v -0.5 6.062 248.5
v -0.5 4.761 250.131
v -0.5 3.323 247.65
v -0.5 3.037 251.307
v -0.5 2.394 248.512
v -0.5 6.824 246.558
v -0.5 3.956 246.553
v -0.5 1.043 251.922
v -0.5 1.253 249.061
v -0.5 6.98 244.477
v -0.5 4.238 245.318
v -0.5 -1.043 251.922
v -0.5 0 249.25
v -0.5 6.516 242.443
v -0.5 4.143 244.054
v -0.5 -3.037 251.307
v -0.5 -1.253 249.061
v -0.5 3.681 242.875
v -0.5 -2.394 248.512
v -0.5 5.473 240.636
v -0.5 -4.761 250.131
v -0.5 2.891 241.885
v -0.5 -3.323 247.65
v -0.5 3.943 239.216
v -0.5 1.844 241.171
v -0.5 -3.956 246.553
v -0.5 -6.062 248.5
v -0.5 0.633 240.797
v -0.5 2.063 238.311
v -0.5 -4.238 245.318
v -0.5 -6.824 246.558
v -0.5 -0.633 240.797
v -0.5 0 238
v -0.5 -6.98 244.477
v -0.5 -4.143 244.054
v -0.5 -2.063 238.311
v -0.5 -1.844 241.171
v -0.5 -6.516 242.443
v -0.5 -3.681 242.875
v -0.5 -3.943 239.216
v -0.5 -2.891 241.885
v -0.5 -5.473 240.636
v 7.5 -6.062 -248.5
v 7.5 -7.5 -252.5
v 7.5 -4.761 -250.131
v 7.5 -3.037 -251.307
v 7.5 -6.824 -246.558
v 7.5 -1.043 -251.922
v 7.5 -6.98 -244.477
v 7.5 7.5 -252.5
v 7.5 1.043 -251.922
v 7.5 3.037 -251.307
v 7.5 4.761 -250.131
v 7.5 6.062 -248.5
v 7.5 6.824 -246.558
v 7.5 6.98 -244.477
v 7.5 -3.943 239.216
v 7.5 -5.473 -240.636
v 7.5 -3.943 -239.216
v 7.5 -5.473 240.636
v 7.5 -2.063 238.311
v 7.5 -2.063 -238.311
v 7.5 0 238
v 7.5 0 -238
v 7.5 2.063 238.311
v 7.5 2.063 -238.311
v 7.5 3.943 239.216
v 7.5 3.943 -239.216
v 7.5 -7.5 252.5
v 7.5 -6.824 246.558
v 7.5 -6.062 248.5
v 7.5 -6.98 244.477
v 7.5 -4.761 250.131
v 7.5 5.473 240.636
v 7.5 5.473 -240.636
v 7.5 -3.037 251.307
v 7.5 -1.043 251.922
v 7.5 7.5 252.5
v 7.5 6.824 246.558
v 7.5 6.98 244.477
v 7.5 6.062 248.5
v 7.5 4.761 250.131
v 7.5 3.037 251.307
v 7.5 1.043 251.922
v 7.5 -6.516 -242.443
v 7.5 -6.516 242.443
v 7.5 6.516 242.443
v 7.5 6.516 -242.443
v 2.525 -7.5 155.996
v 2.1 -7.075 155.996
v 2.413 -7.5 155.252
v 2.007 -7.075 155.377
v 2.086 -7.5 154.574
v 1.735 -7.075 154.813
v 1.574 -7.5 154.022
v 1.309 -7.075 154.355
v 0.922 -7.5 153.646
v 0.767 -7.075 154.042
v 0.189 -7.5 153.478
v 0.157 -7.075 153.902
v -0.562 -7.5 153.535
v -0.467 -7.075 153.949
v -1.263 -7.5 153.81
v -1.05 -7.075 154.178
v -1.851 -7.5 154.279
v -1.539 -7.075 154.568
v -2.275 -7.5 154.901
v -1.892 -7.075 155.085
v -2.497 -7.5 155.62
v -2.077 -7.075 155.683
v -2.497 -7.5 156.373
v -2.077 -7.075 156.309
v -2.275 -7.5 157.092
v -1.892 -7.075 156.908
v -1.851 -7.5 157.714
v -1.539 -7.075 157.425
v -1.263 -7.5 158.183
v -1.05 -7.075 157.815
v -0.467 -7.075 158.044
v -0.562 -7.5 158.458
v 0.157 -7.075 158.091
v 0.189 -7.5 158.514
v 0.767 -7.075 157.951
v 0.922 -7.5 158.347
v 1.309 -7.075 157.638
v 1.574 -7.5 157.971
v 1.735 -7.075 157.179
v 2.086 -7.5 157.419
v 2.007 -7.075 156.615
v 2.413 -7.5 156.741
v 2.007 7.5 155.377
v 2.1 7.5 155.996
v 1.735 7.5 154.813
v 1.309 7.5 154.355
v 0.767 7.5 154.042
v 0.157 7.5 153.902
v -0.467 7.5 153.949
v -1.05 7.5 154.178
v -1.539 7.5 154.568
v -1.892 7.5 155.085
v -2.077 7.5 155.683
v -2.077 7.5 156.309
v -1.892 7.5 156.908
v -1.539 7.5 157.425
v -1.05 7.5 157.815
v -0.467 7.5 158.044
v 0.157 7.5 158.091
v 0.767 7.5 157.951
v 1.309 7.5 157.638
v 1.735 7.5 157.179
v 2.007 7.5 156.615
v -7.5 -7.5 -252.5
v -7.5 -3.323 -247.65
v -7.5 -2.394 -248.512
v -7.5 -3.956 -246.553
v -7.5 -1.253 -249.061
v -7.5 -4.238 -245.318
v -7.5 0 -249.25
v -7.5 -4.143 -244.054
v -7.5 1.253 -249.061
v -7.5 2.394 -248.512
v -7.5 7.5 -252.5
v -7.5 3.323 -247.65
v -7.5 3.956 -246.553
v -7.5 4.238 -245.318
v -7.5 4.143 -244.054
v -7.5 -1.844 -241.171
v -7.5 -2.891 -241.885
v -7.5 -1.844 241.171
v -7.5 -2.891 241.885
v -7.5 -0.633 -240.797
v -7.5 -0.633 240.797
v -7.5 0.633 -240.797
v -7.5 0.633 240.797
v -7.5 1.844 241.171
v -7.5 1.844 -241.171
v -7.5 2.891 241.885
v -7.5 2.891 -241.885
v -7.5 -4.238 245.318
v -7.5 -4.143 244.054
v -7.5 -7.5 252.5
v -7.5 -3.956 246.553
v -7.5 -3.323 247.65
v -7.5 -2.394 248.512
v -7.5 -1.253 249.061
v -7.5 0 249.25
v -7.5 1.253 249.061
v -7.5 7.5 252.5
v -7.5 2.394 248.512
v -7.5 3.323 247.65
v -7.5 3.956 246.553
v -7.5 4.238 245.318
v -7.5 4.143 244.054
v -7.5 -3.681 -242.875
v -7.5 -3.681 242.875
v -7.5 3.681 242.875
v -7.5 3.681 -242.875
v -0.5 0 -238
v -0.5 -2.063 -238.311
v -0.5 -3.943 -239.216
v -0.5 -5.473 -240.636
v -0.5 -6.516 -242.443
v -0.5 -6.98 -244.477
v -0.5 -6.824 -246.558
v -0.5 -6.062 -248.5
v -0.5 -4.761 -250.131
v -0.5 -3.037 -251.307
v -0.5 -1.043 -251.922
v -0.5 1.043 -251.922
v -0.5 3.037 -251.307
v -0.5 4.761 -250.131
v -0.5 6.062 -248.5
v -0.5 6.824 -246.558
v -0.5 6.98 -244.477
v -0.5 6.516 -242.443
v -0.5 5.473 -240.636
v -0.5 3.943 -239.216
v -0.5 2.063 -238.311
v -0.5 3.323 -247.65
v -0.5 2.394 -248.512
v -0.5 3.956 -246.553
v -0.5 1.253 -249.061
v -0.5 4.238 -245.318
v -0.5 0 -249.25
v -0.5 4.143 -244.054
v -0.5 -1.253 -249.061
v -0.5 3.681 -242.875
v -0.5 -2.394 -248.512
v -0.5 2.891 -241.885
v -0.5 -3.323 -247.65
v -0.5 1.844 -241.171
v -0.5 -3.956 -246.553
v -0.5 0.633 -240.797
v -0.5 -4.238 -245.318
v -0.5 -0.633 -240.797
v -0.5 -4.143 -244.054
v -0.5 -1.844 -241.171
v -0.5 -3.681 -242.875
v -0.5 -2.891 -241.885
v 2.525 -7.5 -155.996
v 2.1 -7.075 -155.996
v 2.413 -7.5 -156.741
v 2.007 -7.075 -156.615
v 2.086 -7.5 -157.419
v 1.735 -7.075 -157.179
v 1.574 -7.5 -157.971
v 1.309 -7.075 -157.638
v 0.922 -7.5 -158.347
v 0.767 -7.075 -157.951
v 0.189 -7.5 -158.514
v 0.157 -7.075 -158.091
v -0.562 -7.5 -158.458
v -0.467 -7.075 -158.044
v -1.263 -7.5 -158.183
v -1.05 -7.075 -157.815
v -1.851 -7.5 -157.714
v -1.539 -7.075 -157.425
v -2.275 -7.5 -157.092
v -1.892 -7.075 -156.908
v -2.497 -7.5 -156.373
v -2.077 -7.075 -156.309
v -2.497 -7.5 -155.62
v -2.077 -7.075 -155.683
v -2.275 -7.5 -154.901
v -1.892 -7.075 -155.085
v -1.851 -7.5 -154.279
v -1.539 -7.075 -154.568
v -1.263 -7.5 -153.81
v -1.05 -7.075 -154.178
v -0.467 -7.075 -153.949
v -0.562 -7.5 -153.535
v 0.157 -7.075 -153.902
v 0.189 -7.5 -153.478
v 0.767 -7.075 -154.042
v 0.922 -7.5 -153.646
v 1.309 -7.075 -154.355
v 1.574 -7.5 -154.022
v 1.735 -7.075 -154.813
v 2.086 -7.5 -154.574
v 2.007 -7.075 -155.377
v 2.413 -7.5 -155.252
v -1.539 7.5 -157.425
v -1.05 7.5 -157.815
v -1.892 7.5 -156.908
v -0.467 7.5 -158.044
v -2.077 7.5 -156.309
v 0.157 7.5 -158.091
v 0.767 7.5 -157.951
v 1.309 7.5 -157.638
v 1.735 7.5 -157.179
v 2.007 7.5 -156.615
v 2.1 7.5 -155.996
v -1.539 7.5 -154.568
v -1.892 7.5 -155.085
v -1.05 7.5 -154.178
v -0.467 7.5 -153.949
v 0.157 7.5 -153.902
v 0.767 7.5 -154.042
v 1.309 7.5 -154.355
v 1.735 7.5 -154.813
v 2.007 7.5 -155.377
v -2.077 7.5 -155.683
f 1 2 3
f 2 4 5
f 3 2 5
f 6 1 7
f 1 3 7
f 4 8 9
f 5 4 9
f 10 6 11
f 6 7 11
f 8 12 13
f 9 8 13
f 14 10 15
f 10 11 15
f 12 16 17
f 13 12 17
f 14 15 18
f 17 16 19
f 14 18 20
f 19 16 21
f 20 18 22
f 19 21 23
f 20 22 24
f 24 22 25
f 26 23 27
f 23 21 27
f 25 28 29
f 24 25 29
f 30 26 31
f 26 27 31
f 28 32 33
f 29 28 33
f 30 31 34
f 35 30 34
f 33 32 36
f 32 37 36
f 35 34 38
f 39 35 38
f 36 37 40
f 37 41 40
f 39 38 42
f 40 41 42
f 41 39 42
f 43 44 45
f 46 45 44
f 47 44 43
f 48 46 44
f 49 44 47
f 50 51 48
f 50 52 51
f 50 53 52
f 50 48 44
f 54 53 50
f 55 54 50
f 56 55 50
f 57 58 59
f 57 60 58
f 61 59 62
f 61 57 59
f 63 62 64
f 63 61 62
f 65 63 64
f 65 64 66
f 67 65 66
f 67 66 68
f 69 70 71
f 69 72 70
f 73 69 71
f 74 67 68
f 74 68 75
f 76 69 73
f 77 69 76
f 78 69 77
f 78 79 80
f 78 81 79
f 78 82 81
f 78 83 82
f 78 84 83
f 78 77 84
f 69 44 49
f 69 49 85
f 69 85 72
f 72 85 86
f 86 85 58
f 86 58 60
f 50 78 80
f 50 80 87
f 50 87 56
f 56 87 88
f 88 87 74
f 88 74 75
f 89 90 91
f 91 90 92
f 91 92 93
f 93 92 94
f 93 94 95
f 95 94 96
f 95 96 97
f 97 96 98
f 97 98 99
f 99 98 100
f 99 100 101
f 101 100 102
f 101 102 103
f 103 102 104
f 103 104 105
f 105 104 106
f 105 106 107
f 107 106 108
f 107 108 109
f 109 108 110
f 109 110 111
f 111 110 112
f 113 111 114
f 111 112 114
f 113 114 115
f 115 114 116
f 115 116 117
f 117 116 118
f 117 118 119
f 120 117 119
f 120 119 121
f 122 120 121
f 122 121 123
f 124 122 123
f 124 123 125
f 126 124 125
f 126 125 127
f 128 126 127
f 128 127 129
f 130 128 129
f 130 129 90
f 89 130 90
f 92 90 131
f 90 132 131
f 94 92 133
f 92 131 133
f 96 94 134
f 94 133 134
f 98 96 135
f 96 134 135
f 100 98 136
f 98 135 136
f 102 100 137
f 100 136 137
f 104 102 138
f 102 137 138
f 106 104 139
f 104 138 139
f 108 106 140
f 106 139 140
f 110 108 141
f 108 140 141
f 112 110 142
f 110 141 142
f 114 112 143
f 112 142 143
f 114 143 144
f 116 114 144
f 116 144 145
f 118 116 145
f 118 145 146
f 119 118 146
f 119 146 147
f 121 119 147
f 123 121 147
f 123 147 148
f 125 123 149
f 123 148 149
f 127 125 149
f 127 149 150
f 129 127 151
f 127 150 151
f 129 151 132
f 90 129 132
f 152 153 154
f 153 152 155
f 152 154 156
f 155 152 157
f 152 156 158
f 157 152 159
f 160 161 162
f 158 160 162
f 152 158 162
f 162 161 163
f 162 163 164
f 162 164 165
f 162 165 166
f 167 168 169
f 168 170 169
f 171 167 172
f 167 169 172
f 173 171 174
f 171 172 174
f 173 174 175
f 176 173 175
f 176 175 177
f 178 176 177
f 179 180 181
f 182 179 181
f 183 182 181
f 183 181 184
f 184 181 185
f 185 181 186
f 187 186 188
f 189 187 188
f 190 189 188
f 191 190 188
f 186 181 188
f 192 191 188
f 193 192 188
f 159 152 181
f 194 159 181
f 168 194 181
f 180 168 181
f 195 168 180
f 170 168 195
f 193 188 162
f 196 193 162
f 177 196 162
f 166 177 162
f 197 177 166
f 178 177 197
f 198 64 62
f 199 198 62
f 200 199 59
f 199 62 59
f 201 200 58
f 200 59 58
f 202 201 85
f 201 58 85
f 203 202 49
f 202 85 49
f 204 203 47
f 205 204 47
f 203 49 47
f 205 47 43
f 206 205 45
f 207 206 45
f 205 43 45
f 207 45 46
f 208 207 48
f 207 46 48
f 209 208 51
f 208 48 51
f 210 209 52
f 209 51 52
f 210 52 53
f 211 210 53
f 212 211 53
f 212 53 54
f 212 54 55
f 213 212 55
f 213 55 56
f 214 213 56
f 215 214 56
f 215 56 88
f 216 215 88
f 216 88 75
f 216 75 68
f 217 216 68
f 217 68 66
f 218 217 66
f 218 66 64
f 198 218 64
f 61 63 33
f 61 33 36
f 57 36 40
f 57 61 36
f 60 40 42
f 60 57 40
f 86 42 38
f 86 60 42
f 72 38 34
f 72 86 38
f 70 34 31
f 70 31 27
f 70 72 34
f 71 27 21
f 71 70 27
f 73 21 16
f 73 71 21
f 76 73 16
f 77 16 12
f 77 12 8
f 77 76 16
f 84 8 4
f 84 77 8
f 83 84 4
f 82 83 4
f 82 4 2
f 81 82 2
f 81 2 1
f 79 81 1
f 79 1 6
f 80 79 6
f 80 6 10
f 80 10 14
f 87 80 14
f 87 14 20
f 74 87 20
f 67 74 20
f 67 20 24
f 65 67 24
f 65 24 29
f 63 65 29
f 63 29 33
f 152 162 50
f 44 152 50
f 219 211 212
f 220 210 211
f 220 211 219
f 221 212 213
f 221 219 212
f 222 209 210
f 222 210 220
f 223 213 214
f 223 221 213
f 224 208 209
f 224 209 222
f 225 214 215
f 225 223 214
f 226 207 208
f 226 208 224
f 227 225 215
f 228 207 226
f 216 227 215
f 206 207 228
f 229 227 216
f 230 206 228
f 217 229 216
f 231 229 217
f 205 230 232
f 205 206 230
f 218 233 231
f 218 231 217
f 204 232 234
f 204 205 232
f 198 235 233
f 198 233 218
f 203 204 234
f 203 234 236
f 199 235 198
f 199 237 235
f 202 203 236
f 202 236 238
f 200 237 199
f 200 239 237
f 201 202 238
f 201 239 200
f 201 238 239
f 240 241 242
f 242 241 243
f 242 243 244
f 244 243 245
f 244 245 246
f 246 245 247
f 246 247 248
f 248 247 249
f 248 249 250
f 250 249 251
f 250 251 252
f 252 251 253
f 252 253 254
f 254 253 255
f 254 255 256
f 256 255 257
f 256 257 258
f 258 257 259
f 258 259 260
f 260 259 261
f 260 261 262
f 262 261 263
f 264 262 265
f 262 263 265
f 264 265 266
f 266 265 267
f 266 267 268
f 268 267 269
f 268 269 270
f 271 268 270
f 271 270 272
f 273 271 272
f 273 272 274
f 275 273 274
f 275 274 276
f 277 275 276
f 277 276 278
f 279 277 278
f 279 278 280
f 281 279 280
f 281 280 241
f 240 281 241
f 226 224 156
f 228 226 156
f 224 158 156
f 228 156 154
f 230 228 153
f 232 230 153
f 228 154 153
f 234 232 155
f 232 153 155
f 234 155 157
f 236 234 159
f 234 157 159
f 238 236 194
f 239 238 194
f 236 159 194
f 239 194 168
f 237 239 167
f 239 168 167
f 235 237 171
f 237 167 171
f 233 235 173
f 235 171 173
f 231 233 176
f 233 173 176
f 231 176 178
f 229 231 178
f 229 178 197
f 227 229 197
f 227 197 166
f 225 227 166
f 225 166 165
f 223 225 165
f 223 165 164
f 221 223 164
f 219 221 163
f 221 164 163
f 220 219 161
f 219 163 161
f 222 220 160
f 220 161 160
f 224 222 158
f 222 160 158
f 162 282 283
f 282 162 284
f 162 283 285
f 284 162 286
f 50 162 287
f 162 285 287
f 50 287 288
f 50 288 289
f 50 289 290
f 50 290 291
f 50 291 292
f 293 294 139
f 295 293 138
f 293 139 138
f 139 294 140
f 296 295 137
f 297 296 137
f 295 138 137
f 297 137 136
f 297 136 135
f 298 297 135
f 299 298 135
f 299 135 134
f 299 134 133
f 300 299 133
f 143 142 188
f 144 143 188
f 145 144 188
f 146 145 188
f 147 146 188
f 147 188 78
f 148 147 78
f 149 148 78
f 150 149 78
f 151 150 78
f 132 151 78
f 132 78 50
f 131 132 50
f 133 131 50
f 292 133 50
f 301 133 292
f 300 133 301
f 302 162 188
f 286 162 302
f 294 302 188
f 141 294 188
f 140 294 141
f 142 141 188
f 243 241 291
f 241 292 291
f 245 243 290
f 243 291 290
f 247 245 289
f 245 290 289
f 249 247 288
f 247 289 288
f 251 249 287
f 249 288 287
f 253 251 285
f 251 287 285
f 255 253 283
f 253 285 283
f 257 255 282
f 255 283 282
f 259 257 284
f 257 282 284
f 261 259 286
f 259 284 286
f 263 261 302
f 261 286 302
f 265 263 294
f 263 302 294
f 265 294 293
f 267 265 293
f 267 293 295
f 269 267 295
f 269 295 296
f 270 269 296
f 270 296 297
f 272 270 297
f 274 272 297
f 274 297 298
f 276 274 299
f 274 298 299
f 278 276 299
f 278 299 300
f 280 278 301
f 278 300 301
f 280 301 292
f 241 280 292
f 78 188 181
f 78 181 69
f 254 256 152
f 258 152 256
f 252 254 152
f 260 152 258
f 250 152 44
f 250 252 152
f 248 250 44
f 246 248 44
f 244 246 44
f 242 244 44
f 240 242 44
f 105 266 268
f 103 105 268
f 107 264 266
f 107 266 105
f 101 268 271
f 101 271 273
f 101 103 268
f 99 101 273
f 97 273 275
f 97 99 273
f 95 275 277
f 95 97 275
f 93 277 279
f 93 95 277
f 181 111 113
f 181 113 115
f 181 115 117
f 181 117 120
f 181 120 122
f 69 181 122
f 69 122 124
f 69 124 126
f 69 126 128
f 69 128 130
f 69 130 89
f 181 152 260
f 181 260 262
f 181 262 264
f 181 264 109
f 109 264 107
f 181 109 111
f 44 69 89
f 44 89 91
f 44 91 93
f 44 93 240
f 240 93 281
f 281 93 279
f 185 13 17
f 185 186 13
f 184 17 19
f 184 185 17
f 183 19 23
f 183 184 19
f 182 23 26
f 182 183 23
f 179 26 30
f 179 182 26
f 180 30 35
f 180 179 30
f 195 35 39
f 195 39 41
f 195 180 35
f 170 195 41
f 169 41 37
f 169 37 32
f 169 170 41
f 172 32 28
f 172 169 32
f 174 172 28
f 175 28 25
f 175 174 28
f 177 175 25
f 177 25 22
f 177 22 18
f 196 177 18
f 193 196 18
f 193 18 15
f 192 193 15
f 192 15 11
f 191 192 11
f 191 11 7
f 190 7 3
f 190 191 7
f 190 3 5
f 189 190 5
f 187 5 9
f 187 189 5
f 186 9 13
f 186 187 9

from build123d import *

# Parameters (mm, degrees)
IZIM1_W                     = 15
IZIM1_H                     = 15
Y_KSEKLIK_EKSTR_ZYON1_DEPTH = 252.5
DELIK1_D                    = 8.5
DELIK1_CBORE_D              = 14
DELIK1_CBORE_DEPTH          = 8
M5_DI_LI_DELIK1_D           = 4.2
M5_DI_LI_DELIK1_DEPTH       = 24
M5_DI_LI_DELIK1_CSINK_D     = 5.05
M5_DI_LI_DELIK1_CSINK_ANGLE = 90
M5_DI_LI_DELIK1_TIP         = 1.2618073


with BuildPart() as part:
    # Çizim1 → Yükseklik-Ekstrüzyon1 (new, symmetric)
    with BuildSketch(Plane.XY):
        Rectangle(IZIM1_W, IZIM1_H)
    extrude(amount=Y_KSEKLIK_EKSTR_ZYON1_DEPTH, both=True)

    # Delik1 (through all)
    with Locations(Plane(origin=(7.5, 0, -245), x_dir=(0, 0, 1), z_dir=(1, 0, 0))):
        with Locations((0, 0)):
            delik1 = CounterBoreHole(DELIK1_D / 2, DELIK1_CBORE_D / 2, DELIK1_CBORE_DEPTH)

    # Aynalama1: Delik1 across plane
    add(delik1.mirror(Plane.XY), mode=Mode.SUBTRACT)

    # M5 Dişli Delik1
    with Locations(Plane(origin=(0, -7.5, 0), x_dir=(-1, 0, 0), z_dir=(0, -1, 0))):
        with Locations((0, 155.996395214), (0, -155.996395214)):
            CounterSinkHole(M5_DI_LI_DELIK1_D / 2, M5_DI_LI_DELIK1_CSINK_D / 2, depth=M5_DI_LI_DELIK1_DEPTH, counter_sink_angle=M5_DI_LI_DELIK1_CSINK_ANGLE)
            with Locations((0, 0, -(M5_DI_LI_DELIK1_DEPTH + M5_DI_LI_DELIK1_TIP / 2))):  # 118° drill point
                Cone(0, M5_DI_LI_DELIK1_D / 2, M5_DI_LI_DELIK1_TIP, mode=Mode.SUBTRACT)


solid = part.part
